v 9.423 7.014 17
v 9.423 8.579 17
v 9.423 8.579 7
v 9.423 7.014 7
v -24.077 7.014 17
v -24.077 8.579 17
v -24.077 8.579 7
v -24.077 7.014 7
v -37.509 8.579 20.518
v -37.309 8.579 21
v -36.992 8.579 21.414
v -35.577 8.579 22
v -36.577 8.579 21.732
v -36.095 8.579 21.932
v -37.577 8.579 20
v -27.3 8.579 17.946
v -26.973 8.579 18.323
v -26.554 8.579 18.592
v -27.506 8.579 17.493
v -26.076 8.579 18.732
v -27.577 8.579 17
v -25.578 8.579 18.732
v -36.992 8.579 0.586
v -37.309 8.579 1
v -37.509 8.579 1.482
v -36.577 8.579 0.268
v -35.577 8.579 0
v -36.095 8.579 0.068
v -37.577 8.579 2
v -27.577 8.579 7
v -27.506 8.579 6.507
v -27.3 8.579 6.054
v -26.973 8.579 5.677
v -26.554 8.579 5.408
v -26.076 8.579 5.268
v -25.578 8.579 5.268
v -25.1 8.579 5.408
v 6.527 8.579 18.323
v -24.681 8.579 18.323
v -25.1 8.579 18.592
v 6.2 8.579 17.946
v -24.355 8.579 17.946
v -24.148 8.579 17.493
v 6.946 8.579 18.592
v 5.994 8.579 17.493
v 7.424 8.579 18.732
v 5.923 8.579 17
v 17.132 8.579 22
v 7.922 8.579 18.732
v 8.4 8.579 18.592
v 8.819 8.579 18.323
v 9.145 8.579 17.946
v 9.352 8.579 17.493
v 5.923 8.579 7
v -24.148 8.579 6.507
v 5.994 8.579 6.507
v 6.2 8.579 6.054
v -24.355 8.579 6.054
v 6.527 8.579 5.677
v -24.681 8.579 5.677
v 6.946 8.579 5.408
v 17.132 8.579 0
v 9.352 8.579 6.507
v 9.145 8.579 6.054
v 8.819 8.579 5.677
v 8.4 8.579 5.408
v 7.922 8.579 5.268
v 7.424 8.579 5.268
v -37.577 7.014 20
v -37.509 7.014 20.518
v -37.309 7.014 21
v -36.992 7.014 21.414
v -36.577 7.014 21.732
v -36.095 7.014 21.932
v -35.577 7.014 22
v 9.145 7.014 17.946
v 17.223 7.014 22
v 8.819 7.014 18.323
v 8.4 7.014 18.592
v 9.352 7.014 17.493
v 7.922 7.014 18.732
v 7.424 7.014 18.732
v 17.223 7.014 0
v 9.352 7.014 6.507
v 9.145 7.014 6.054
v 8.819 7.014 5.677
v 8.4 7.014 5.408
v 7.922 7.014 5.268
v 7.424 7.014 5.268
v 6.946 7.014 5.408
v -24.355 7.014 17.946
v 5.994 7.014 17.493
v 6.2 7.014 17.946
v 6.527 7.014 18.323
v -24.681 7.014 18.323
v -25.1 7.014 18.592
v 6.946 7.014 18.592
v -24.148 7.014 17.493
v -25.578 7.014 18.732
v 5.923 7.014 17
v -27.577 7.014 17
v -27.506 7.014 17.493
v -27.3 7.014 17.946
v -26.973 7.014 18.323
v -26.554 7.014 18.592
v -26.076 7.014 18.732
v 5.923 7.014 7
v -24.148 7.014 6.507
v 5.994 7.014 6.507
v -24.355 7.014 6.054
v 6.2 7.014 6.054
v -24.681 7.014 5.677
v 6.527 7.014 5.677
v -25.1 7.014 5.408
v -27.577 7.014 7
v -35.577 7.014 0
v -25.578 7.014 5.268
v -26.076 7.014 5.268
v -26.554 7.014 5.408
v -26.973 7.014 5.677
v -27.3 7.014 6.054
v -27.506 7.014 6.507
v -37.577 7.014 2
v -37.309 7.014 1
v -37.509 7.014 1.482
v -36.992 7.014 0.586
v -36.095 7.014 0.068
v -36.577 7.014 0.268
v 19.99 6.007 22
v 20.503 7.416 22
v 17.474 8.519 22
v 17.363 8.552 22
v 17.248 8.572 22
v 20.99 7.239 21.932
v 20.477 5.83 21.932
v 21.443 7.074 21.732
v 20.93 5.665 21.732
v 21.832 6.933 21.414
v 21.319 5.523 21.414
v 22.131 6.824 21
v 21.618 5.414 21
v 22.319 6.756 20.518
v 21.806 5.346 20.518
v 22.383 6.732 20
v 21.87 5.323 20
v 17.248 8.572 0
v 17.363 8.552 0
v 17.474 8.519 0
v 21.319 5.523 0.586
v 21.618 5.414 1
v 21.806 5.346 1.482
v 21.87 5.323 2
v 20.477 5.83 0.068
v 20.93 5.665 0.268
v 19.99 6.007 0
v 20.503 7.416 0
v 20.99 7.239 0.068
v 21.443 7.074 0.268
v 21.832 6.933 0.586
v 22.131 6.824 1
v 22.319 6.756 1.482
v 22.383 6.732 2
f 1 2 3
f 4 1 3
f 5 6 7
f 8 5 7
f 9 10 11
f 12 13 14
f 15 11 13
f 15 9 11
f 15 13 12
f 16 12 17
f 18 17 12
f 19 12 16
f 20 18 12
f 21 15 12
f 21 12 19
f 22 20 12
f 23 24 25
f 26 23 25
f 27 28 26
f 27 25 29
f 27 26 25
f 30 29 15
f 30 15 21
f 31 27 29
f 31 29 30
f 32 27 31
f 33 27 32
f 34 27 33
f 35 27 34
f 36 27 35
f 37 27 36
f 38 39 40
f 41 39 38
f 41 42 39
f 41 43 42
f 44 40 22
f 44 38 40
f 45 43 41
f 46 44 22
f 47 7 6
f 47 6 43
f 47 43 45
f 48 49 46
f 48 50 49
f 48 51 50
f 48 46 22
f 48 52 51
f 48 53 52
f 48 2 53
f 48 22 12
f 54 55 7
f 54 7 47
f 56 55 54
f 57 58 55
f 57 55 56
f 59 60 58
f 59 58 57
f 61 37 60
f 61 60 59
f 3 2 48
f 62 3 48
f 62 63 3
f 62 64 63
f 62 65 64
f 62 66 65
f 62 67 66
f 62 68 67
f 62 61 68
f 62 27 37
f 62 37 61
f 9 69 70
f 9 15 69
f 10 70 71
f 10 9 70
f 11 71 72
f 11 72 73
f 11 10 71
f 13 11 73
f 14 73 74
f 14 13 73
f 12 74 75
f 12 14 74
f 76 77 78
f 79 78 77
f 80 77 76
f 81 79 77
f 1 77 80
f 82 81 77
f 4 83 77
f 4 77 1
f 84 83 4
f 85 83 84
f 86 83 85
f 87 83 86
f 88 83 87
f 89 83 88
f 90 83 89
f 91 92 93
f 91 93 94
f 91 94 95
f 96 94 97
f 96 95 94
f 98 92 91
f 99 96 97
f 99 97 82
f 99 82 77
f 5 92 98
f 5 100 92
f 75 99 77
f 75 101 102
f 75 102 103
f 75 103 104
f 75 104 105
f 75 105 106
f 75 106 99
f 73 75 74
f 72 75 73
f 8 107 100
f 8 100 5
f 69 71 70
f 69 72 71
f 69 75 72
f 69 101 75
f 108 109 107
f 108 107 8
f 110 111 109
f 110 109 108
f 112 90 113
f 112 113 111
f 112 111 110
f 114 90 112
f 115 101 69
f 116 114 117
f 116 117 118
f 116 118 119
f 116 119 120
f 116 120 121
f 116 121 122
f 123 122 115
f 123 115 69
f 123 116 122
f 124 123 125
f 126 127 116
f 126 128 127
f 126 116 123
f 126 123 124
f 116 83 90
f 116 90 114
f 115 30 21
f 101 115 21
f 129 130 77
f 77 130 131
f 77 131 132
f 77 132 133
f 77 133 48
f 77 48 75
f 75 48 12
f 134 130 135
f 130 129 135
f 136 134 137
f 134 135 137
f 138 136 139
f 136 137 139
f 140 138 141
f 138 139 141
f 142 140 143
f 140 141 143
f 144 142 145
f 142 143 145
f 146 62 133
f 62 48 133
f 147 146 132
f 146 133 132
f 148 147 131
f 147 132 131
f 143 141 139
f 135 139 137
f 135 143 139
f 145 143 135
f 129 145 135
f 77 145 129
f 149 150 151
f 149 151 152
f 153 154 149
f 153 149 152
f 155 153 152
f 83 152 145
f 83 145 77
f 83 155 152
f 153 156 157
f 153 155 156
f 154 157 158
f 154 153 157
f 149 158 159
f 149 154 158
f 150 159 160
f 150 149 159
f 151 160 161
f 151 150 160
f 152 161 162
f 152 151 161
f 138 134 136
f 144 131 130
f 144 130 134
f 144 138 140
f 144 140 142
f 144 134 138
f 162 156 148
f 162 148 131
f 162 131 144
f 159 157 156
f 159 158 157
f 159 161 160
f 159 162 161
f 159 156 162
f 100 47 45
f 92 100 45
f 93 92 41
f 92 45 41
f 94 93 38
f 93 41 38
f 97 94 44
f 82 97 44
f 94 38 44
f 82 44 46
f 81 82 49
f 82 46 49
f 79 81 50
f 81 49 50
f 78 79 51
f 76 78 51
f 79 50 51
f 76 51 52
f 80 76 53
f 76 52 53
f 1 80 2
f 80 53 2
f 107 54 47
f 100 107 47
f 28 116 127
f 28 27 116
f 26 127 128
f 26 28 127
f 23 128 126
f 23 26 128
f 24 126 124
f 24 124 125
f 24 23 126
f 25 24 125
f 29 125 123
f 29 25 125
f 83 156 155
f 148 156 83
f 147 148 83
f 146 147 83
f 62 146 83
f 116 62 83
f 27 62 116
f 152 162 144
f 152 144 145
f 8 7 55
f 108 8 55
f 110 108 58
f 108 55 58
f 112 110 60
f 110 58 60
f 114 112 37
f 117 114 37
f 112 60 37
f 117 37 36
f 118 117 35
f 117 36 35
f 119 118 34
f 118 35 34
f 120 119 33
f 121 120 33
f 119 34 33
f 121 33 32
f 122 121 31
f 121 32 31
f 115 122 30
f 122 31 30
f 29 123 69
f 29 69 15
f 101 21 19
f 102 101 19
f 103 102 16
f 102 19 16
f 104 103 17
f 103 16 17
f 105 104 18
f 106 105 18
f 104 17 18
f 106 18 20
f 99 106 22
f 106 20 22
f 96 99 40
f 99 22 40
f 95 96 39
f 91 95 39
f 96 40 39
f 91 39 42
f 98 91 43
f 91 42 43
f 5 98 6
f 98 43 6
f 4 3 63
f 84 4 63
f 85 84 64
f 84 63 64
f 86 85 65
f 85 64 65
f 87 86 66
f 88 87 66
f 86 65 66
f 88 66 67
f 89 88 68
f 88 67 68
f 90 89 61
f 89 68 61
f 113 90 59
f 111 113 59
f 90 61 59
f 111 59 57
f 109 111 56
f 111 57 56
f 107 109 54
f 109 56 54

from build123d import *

# Parameters (mm, degrees)
BOSS_EXTRUDE1_DEPTH = 22
FILLET1_R           = 1
FILLET2_R           = 2
CUT_EXTRUDE1_DEPTH  = 4.256447705


with BuildPart() as part:
    # Sketch1 → Boss-Extrude1 (new body)
    with BuildSketch(Plane.XY):
        Polygon((-37.577345781, 8.579229267), (17.308314067, 8.579229267), (22.382654219, 6.732320493), (21.869624004, 5.322781562), (17.222654219, 7.014140243), (-37.577345781, 7.014140243), align=None)
    extrude(amount=BOSS_EXTRUDE1_DEPTH)

    # Fillet1
    fillet1_edges = [part.edges().sort_by_distance(p)[0] for p in [
        (17.308314067, 8.579229267, 11),
    ]]
    fillet(fillet1_edges, radius=FILLET1_R)

    # Fillet2
    fillet2_edges = [part.edges().sort_by_distance(p)[0] for p in [
        (22.126139112, 6.027551028, 22),
        (-37.577345781, 7.796684755, 22),
        (22.126139112, 6.027551028, 0),
        (-37.577345781, 7.796684755, 0),
    ]]
    fillet(fillet2_edges, radius=FILLET2_R)

    # Sketch3 → Cut-Extrude1 (cut, through all)
    with BuildSketch(Plane(origin=(0, 8.579229267, 0), x_dir=(1, 0, 0), z_dir=(0, 1, 0))):
        with BuildLine():
            Line((-24.077345781, -17), (-24.077345781, -7))
            ThreePointArc((-24.077345781, -7), (-25.827345781, -5.25), (-27.577345781, -7))
            Line((-27.577345781, -7), (-27.577345781, -17))
            ThreePointArc((-27.577345781, -17), (-25.827345781, -18.75), (-24.077345781, -17))
        make_face()
        with BuildLine():
            Line((9.422654219, -17), (9.422654219, -7))
            ThreePointArc((9.422654219, -7), (7.672654219, -5.25), (5.922654219, -7))
            Line((5.922654219, -7), (5.922654219, -17))
            ThreePointArc((5.922654219, -17), (7.672654219, -18.75), (9.422654219, -17))
        make_face()
    extrude(amount=-CUT_EXTRUDE1_DEPTH, mode=Mode.SUBTRACT)


solid = part.part
